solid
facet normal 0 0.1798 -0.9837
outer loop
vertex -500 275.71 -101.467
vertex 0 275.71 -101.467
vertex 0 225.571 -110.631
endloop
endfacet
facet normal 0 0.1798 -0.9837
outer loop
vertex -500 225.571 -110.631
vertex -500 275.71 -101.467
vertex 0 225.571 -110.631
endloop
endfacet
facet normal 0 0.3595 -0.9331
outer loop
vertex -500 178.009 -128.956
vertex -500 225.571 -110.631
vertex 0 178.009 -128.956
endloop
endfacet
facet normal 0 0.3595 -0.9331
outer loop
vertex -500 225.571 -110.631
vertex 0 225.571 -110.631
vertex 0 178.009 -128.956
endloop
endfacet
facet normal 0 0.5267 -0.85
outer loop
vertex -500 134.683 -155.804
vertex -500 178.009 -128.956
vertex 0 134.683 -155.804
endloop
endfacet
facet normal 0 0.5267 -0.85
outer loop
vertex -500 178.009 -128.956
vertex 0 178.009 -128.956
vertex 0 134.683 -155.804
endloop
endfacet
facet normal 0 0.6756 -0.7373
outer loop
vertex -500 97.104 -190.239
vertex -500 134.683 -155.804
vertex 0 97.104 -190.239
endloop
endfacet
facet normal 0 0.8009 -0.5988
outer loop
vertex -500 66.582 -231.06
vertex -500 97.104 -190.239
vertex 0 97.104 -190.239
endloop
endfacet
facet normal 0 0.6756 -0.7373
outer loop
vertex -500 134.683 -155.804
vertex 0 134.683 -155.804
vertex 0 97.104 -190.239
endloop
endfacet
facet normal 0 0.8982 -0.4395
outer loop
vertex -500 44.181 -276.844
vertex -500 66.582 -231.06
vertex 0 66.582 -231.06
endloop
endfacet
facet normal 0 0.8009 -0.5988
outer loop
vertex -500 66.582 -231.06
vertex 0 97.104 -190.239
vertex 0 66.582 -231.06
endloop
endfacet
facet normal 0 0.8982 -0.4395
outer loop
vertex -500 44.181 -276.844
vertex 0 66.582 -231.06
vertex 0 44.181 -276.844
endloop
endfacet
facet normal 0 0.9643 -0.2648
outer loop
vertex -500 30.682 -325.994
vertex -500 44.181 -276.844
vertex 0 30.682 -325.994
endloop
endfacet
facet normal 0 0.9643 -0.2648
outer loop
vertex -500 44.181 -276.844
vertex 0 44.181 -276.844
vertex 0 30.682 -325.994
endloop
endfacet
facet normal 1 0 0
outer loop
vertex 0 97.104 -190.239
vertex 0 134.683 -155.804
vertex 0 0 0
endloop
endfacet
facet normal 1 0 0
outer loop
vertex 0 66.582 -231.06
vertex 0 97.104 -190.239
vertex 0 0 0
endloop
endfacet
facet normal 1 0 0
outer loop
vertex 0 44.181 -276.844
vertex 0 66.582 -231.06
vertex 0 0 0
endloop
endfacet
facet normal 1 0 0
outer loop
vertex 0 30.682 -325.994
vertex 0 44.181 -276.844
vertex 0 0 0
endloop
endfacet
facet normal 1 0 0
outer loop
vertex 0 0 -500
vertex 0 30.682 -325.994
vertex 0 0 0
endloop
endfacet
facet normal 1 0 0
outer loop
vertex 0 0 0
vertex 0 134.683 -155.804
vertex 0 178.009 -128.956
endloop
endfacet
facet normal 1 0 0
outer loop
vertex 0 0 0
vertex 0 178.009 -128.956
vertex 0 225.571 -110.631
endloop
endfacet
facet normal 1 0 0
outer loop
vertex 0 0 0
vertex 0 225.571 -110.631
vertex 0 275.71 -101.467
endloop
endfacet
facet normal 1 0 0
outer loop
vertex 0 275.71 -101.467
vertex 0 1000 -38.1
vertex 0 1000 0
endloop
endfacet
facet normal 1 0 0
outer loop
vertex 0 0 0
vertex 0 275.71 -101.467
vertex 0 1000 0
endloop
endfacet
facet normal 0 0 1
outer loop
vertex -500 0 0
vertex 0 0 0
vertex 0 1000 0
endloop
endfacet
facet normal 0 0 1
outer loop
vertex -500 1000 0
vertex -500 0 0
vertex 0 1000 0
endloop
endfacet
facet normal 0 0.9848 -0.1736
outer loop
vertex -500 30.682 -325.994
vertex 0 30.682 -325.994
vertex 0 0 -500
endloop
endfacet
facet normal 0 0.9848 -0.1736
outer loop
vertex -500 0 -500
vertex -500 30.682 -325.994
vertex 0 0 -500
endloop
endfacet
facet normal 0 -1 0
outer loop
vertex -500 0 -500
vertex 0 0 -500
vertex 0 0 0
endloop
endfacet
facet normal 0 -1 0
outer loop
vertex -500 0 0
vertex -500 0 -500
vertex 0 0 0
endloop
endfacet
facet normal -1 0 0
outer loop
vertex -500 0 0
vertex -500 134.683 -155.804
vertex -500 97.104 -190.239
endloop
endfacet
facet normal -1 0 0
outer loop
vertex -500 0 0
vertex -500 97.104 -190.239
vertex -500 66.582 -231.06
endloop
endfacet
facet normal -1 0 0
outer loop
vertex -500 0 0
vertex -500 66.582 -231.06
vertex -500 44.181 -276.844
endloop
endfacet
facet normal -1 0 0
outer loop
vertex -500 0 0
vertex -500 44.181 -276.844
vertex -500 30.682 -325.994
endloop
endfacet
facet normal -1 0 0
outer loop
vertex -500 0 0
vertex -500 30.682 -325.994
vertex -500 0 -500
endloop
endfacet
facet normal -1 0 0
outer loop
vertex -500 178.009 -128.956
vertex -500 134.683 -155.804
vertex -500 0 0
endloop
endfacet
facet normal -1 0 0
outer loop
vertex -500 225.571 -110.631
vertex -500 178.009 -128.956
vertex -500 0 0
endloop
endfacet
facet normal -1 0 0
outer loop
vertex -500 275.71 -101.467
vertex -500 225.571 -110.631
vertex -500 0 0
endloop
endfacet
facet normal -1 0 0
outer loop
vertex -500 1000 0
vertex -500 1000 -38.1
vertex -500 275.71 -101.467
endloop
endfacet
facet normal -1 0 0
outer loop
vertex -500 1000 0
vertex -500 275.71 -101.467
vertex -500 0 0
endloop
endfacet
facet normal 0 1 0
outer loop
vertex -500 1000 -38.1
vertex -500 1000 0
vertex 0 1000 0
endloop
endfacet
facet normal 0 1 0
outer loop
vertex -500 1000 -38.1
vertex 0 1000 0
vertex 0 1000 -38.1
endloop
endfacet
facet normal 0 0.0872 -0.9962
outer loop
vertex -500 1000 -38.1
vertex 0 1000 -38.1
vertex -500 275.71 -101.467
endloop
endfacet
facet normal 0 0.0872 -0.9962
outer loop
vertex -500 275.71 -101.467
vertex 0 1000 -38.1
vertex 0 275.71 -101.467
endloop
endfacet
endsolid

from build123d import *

# Parameters (mm, degrees)
BOSS_EXTRUDE1_DEPTH = 500


with BuildPart() as part:
    # Sketch1 → Boss-Extrude1 (new body)
    with BuildSketch(Plane(origin=(0, 0, 0), x_dir=(0, 0, -1), z_dir=(1, 0, 0))):
        with BuildLine():
            Line((38.1, 1000), (101.4671252, 275.710444691))
            ThreePointArc((101.4671252, 275.710444691), (172.142788026, 115.087782586), (325.99444252, 30.681874577))
            Line((325.99444252, 30.681874577), (500, 0))
            Line((500, 0), (0, 0))
            Line((0, 0), (0, 1000))
            Line((0, 1000), (38.1, 1000))
        make_face()
    extrude(amount=-BOSS_EXTRUDE1_DEPTH)


solid = part.part
